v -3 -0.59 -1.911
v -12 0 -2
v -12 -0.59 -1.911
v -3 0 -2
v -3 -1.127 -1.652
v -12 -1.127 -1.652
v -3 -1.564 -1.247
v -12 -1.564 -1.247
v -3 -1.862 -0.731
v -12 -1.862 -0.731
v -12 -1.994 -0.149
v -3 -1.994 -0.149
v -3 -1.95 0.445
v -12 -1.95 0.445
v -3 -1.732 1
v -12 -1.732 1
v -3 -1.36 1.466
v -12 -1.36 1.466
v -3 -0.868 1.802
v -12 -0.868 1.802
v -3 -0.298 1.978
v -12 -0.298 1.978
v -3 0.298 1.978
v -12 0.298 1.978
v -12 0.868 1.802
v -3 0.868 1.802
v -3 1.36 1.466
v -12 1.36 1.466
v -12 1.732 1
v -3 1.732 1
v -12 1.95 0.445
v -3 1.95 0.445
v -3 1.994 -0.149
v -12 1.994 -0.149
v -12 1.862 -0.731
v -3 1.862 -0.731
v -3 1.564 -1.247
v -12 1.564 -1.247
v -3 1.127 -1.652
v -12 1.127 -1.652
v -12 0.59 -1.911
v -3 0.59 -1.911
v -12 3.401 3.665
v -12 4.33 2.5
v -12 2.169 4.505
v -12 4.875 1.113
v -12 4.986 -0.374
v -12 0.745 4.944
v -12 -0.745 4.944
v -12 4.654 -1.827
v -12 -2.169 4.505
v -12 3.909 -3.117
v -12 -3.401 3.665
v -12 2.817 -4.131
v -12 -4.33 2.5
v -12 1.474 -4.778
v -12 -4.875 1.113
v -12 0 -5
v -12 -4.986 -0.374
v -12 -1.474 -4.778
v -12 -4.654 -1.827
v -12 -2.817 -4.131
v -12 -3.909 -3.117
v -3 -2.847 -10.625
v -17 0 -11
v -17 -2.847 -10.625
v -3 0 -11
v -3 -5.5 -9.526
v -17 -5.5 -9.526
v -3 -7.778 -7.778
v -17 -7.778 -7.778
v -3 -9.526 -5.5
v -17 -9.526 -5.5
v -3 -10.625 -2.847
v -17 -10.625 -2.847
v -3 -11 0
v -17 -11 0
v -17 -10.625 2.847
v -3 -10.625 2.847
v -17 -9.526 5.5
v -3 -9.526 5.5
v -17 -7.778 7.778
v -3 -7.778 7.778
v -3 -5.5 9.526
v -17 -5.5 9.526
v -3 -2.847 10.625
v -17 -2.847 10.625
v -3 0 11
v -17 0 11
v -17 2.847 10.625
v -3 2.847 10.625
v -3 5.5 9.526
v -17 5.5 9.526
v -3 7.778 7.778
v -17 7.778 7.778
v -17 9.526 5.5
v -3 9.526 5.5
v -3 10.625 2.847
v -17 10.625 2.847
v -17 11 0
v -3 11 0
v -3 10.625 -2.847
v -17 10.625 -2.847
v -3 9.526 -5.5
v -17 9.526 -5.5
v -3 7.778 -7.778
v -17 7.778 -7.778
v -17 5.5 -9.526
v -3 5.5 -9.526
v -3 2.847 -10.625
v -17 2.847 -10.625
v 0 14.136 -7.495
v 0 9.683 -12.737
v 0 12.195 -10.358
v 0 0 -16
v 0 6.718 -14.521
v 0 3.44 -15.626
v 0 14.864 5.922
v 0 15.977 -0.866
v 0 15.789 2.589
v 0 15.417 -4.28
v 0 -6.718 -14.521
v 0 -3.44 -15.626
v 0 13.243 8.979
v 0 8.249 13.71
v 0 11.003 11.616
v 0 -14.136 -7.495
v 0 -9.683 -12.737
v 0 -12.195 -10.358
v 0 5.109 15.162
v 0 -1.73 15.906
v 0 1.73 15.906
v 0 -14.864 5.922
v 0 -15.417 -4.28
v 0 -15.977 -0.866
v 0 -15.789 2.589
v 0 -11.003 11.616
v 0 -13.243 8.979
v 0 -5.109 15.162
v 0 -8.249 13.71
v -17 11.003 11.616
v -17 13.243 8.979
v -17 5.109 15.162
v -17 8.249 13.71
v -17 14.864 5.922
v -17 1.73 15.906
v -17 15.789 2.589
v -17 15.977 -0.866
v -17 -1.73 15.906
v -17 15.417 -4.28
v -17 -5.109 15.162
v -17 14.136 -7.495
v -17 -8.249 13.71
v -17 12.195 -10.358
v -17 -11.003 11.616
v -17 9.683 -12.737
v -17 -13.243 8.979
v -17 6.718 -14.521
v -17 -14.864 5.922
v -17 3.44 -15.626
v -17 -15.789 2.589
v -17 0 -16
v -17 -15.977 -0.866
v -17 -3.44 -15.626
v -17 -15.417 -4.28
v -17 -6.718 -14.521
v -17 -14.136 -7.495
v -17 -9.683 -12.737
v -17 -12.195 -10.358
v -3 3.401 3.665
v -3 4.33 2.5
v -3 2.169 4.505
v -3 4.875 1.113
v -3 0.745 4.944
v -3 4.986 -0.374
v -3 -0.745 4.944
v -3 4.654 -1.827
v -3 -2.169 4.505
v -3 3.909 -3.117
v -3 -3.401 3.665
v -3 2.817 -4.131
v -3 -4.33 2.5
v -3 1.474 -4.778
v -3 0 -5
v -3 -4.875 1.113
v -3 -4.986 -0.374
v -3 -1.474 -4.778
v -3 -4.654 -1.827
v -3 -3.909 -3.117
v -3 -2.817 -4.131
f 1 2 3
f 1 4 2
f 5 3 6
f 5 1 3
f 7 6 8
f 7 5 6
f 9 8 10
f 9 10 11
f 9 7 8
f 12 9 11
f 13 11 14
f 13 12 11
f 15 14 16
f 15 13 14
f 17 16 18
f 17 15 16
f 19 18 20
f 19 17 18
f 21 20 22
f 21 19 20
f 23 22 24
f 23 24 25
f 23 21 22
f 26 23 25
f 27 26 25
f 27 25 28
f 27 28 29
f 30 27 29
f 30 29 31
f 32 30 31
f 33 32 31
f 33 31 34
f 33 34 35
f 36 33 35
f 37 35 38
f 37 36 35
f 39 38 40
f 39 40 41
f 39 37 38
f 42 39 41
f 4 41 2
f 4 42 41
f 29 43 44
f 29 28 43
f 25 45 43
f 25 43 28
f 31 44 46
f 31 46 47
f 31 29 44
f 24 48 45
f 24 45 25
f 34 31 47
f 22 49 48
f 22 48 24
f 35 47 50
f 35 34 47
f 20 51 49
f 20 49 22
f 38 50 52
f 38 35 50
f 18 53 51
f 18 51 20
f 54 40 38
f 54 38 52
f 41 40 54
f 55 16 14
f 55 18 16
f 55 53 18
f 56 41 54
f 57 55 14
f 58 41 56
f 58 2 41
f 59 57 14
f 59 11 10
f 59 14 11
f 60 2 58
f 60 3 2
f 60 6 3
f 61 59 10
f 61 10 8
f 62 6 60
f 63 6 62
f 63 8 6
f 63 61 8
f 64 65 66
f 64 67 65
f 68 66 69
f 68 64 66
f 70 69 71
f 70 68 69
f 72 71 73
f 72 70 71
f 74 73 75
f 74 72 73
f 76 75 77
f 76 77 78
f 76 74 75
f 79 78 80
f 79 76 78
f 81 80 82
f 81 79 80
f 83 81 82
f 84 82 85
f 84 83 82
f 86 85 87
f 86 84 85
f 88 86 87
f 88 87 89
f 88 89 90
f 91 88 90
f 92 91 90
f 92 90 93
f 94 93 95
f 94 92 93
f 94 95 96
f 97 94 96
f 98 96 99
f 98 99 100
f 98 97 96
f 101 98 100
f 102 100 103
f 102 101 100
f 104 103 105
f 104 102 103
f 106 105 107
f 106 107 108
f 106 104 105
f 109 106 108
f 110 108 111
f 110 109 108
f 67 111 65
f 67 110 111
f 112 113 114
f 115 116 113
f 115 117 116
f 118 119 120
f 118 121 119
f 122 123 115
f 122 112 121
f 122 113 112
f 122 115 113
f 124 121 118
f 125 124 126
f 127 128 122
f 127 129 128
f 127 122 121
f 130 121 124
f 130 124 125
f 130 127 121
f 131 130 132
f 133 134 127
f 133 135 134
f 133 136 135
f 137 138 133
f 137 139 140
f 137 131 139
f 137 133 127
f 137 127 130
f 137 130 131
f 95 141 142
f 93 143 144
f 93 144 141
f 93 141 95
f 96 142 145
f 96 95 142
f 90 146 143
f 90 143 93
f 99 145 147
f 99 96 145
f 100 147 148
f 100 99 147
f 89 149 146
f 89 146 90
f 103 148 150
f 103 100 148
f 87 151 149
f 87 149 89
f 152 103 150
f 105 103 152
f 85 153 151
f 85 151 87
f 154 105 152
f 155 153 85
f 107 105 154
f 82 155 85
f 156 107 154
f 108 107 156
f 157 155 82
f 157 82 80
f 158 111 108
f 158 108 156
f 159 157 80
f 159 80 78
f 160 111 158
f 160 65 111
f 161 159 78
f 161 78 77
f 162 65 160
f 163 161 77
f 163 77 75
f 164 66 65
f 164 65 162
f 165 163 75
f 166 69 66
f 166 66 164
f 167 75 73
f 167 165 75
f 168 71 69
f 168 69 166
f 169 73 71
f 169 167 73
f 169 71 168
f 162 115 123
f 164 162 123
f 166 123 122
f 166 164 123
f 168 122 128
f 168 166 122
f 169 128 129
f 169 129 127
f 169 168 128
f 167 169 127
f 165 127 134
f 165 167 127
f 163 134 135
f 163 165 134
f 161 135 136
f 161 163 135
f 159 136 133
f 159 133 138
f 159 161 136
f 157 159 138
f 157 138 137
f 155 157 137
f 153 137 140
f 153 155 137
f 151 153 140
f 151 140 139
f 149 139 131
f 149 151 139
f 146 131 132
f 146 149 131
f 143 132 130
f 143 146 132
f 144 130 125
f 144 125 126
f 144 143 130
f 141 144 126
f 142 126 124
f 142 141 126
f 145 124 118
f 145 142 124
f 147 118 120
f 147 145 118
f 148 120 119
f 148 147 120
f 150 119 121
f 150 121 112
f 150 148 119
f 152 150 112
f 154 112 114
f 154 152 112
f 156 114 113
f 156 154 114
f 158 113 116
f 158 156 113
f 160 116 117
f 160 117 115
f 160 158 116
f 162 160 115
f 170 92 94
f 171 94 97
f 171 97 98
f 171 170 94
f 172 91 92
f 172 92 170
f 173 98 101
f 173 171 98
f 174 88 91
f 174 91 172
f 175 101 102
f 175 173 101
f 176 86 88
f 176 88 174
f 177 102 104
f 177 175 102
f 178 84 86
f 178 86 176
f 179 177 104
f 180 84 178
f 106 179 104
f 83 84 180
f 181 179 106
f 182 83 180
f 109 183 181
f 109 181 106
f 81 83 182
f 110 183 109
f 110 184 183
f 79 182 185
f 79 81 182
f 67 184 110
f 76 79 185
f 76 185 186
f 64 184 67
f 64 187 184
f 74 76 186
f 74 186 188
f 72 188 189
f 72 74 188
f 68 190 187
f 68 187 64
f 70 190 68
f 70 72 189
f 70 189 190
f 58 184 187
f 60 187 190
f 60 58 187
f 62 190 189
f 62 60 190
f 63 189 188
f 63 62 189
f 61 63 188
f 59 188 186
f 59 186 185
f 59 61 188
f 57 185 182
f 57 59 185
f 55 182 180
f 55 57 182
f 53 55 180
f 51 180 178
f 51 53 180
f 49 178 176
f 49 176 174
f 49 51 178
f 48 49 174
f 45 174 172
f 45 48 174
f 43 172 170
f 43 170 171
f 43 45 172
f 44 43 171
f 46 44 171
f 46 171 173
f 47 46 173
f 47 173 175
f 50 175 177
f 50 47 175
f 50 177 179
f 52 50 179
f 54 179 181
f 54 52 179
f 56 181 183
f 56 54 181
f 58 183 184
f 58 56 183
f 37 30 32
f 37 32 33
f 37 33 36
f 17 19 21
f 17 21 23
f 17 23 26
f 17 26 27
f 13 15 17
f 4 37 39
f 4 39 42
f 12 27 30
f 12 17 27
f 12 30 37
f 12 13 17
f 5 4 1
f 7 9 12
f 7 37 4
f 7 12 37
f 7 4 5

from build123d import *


with BuildPart() as part:
    # Esboço1 → Revolução1 (revolve)
    with BuildSketch(Plane.XY, mode=Mode.PRIVATE) as revolu_o1_sk:
        Polygon((0, 0), (0, 16), (-17, 16), (-17, 11), (-3, 11), (-3, 5), (-12, 5), (-12, 2), (-3, 2), (-3, 0), align=None)
    revolve(revolu_o1_sk.sketch.rotate(Axis((0, 0, 0), (-1, 0, 0)), 90), axis=Axis((0, 0, 0), (-1, 0, 0)))


solid = part.part
